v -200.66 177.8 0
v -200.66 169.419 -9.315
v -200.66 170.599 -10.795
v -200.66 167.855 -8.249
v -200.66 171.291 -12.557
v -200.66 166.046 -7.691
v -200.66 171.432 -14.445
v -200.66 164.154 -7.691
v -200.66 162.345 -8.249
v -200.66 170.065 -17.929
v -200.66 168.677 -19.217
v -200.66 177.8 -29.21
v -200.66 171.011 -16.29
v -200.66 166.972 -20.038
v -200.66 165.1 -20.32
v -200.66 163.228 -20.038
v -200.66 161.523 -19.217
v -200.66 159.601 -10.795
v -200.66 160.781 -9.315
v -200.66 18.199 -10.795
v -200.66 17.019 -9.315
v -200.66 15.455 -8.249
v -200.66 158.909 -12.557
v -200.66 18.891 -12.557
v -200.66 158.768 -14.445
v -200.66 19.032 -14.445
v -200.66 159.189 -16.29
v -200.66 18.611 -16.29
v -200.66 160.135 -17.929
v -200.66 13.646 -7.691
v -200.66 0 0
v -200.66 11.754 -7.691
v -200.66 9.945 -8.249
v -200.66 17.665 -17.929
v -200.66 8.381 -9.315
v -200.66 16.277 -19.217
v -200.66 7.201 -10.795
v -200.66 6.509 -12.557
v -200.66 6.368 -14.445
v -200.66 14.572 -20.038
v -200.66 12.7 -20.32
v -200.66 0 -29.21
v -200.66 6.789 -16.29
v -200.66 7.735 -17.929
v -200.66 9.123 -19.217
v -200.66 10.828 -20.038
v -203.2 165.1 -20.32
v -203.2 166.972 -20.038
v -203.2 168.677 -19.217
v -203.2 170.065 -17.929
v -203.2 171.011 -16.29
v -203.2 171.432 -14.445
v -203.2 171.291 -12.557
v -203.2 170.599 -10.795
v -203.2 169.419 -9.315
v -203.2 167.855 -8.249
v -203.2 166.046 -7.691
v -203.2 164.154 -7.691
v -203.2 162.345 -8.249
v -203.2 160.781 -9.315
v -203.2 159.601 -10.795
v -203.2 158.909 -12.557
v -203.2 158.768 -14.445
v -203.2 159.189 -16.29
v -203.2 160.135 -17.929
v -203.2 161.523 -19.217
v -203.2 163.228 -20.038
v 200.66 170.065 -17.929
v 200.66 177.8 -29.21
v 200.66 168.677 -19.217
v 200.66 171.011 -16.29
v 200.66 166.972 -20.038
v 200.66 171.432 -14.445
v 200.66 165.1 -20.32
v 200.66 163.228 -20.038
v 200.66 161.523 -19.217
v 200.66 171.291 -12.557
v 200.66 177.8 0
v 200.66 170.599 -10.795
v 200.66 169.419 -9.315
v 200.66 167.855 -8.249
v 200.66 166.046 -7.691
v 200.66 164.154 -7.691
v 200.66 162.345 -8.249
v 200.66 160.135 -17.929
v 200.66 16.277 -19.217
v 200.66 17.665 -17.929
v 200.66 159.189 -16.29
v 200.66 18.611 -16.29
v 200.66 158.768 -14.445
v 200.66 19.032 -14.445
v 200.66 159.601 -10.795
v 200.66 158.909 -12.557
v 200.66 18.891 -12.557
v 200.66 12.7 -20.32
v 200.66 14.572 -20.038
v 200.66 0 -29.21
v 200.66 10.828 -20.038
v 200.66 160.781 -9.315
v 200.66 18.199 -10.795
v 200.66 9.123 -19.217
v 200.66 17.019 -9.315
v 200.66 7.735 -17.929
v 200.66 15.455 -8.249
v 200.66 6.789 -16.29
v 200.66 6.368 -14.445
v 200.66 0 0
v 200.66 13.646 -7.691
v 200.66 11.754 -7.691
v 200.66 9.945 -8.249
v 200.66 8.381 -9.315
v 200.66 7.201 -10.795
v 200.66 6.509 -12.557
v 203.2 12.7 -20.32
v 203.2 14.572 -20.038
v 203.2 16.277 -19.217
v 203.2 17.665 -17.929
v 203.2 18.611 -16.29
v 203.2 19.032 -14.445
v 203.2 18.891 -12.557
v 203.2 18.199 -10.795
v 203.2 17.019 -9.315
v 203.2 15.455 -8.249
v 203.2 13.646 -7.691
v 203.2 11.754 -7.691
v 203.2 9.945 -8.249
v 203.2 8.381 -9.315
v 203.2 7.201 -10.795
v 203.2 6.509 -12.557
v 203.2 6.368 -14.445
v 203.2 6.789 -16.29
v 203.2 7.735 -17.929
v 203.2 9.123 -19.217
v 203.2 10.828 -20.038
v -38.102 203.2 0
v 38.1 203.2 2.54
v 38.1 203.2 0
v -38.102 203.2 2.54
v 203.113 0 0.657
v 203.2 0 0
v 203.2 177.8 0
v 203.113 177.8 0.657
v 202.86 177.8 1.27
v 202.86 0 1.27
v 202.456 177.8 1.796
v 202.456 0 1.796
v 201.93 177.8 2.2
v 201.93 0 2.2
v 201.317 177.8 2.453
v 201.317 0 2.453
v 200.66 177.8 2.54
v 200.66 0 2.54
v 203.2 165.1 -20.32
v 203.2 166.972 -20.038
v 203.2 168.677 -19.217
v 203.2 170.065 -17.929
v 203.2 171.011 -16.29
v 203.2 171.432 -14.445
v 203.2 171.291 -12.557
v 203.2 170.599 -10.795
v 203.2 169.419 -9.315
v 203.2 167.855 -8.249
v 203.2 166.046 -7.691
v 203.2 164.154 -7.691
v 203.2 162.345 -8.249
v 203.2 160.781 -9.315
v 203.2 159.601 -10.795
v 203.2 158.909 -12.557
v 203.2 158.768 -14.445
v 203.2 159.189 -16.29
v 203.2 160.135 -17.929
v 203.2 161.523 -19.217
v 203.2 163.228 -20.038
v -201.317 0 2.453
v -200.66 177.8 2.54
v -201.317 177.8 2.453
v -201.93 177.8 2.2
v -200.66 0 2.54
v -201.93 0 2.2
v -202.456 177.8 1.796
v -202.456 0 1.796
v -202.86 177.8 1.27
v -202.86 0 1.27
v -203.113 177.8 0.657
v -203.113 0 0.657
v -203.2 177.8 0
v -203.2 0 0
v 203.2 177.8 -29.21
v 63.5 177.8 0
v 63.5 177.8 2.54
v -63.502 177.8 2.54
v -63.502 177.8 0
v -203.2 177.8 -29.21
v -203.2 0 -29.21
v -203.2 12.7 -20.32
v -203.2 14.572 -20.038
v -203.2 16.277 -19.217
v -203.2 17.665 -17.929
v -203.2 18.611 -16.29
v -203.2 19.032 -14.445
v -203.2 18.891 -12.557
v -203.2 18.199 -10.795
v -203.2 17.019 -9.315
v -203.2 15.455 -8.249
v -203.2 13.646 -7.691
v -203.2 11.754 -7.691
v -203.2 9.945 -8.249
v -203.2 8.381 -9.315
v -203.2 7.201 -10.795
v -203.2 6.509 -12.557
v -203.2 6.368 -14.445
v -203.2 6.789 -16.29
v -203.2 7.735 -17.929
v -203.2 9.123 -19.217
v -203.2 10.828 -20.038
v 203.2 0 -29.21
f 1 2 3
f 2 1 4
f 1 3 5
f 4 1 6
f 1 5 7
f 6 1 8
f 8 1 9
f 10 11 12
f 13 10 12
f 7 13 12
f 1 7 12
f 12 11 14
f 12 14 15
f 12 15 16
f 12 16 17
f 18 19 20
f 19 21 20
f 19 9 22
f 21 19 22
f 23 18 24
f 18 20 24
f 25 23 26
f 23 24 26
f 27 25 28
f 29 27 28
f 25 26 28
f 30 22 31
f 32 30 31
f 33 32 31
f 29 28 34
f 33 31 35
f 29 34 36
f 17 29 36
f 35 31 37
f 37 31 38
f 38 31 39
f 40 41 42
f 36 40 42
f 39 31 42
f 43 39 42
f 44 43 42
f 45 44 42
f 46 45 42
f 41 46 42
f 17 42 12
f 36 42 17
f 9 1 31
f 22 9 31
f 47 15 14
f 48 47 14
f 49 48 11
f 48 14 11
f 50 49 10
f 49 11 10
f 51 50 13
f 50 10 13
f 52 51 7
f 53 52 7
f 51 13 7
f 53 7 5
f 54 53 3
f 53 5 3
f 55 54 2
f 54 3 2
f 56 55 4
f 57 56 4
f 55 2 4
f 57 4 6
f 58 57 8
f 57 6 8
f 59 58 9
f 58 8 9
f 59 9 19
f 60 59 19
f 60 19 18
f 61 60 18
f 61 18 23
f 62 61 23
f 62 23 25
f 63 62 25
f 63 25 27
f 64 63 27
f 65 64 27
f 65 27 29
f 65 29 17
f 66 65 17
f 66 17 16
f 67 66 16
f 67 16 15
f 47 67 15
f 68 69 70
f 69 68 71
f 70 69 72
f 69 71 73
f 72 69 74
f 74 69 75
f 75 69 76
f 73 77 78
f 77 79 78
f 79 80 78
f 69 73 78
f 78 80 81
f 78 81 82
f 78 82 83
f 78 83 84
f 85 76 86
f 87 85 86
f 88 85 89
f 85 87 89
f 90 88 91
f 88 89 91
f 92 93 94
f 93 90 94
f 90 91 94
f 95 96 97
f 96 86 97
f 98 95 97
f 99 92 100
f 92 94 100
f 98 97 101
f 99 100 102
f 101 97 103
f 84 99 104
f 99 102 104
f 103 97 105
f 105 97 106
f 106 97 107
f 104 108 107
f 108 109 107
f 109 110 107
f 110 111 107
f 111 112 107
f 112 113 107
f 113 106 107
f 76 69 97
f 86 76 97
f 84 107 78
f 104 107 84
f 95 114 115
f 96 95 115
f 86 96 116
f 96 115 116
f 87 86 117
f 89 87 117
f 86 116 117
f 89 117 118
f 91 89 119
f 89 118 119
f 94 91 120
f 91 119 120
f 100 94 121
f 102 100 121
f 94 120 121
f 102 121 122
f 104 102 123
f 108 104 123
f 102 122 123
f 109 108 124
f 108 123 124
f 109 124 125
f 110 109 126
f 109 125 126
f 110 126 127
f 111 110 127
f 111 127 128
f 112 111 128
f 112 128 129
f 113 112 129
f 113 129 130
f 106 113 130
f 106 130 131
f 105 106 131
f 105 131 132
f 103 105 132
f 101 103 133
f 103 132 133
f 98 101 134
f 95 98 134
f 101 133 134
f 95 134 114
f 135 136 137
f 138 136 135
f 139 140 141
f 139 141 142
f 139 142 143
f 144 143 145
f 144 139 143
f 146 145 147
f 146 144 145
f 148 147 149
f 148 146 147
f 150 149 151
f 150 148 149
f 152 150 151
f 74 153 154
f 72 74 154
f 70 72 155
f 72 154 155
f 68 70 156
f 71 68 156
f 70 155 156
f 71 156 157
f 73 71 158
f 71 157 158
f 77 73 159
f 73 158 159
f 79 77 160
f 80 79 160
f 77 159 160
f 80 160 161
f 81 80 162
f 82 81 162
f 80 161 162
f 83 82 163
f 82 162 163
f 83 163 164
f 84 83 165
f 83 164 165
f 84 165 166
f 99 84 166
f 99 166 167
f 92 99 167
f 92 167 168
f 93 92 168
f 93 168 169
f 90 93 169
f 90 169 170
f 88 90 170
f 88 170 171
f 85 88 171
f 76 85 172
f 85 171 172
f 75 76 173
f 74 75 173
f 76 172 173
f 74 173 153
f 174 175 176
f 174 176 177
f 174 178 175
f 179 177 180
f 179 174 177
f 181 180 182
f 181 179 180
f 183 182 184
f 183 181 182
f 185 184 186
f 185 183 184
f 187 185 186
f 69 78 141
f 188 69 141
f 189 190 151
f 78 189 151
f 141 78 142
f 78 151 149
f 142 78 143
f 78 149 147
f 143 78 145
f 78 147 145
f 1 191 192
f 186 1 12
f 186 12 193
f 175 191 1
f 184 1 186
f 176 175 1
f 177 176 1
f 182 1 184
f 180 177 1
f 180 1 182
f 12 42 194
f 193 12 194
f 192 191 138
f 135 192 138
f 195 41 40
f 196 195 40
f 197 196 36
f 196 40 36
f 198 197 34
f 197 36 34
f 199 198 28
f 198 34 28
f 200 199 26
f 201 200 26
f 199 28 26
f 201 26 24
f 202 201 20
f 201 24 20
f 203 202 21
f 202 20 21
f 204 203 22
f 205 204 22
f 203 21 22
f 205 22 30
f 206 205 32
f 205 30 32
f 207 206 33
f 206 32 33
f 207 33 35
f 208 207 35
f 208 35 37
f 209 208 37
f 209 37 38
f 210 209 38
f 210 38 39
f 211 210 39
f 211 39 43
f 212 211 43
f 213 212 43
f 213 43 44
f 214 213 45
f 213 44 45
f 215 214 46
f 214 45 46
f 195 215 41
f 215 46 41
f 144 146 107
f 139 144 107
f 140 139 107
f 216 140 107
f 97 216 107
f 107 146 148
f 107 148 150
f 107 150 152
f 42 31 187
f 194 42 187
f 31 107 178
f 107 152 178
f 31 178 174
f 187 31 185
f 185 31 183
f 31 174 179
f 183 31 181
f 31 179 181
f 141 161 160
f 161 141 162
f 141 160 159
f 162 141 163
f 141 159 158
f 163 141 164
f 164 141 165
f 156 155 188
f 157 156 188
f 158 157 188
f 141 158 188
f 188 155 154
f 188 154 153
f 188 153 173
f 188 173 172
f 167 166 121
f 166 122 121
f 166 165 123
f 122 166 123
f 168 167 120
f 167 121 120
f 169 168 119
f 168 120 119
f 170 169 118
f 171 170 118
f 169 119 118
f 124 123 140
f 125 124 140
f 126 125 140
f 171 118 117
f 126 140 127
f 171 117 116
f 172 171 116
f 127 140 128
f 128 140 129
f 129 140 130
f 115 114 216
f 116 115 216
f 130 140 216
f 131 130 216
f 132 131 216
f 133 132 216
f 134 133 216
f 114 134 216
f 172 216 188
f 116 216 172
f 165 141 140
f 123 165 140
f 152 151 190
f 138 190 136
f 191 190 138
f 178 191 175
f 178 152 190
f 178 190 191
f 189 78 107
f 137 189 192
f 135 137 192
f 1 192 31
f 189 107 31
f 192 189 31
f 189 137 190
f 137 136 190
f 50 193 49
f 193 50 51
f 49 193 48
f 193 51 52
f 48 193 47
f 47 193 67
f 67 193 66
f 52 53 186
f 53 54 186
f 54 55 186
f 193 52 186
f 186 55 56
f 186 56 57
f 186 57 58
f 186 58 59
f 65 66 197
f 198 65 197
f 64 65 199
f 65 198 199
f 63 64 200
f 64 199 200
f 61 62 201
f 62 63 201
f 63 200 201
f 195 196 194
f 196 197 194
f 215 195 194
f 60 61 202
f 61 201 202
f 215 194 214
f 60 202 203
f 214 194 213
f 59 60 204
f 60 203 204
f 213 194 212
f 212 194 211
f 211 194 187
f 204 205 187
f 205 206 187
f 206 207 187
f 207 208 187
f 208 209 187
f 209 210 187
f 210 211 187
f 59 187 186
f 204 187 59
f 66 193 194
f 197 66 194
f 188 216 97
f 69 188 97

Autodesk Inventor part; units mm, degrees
ref_plane "YZ Plane" through (0, 0, 0) normal (1, 0, 0) x (0, 1, 0)
ref_plane "XZ Plane" through (0, 0, 0) normal (0, 1, 0) x (-1, 0, 0)
ref_plane "XY Plane" through (0, 0, 0) normal (0, 0, 1) x (1, 0, 0)
sketch "Sketch1" plane through (0, 0, 0) normal (0, 1, 0) x (-1, 0, 0)
  line L0 (-203.2, 0) -> (203.2, 0)
  line L1 (-200.66, 0) -> (-203.2, 0)
  line L2 (-203.2, 0) -> (-203.2, -22.86)
  line L3 (-200.66, -22.86) -> (-200.66, 0)
  line L4 (203.2, 0) -> (200.66, 0)
  line L5 (203.2, -22.86) -> (203.2, 0)
  arc A0 (-200.66, 2.54) -> (-203.2, 0) centre (-200.66, 0) ccw
  arc A1 (203.2, 0) -> (200.66, 2.54) centre (200.66, 0) ccw
  line L6 (-200.66, 2.54) -> (200.66, 2.54)
  line L7 (200.66, 0) -> (200.66, -29.21)
  line L8 (200.66, -29.21) -> (203.2, -29.21)
  line L9 (203.2, -29.21) -> (203.2, -22.86)
  line L10 (-203.2, 0) -> (-203.2, -29.21)
  line L11 (-203.2, -29.21) -> (-200.66, -29.21)
  line L12 (-200.66, -29.21) -> (-200.66, -22.86)
  line L13 (203.2, 0) -> (200.66, 0)
  point P0 (0, 0)
  dimension "d0" = 406.4
  dimension "d1" = 2.54
  dimension "d5" = 2.54
  dimension "d6" = 2.54
  dimension "d7" = 401.32
  dimension "d8" = 29.21
  dimension "d9" = 29.21
extrude "Extrusion1" add sketch "Sketch1" along normal blind 203.2
sketch "Sketch2" plane through (203.2, 0, 0) normal (1, 0, 0) x (0, 0, -1)
  circle A0 centre (13.97, 12.7) radius 6.35
  circle A1 centre (13.97, 165.1) radius 6.35
  point P0 (0, 0)
  dimension "d12" = 12.7
  dimension "d13" = 12.7
extrude "Extrusion2" cut sketch "Sketch2" against normal blind 406.4
sketch "Sketch3" plane through (-200.66, 0, 2.54) normal (0, 0, 1) x (1, 0, 0)
  line L0 (-2.54, 0) -> (-2.54, 203.2) projected
  line L1 (0, 203.2) -> (401.32, 203.2) projected
  line L2 (0, 203.2) -> (-2.54, 203.2) projected
  line L3 (403.86, 203.2) -> (401.32, 203.2) projected
  line L4 (403.86, 0) -> (403.86, 203.2) projected
  line L5 (0, 0) -> (401.32, 0) projected
  line L6 (403.86, 0) -> (401.32, 0) projected
  line L7 (0, 0) -> (-2.54, 0) projected
  line L8 (0, 177.8) -> (200.66, 177.8)
  line L9 (200.66, 177.8) -> (200.66, 203.2)
  line L10 (200.66, 203.2) -> (0, 203.2)
  line L11 (0, 177.8) -> (-2.54, 177.8)
  line L12 (-2.54, 177.8) -> (-2.54, 203.2)
  line L13 (-2.54, 203.2) -> (0, 203.2)
  line L14 (162.56, 203.2) -> (238.76, 203.2)
  line L15 (238.76, 203.2) -> (238.76, 177.8)
  line L16 (238.76, 177.8) -> (162.56, 177.8)
  line L17 (162.56, 177.8) -> (162.56, 203.2)
  point P0 (200.66, 0)
  dimension "d16" = 76.2
  dimension "d17" = 25.4
sketch "Sketch4" plane through (-200.66, 0, 2.54) normal (0, 0, 1) x (1, 0, 0)
  line L0 (0, 203.2) -> (401.32, 203.2) projected
  line L1 (162.558, 203.2) -> (198.118, 203.2) construction
  line L2 (264.16, 177.8002) -> (238.76, 177.8002)
  line L3 (238.76, 203.2) -> (264.1598, 177.8002)
  line L4 (264.1598, 177.8002) -> (406.3779, 177.8002)
  line L5 (403.86, 0) -> (403.86, 203.2) projected
  line L6 (403.86, 177.8002) -> (403.86, 203.2)
  line L7 (403.86, 203.2) -> (238.76, 203.2)
  line L8 (162.558, 177.8002) -> (137.158, 177.8002)
  line L9 (137.158, 177.8002) -> (162.558, 203.2)
  line L10 (162.558, 203.2) -> (-2.542, 203.2)
  line L11 (-2.542, 177.8002) -> (-2.542, 203.2)
  line L12 (-2.542, 203.2) -> (162.558, 203.2)
  line L13 (137.158, 177.8002) -> (-2.542, 177.8002)
  line L14 (-2.54, 0) -> (-2.54, 203.2) projected
  point P0 (200.66, 0)
  dimension "d21" = 25.4
  dimension "d22" = 165.1
extrude "Extrusion3" cut sketch "Sketch4" against normal blind 31.75
properties part number "4barFrontPlate"
